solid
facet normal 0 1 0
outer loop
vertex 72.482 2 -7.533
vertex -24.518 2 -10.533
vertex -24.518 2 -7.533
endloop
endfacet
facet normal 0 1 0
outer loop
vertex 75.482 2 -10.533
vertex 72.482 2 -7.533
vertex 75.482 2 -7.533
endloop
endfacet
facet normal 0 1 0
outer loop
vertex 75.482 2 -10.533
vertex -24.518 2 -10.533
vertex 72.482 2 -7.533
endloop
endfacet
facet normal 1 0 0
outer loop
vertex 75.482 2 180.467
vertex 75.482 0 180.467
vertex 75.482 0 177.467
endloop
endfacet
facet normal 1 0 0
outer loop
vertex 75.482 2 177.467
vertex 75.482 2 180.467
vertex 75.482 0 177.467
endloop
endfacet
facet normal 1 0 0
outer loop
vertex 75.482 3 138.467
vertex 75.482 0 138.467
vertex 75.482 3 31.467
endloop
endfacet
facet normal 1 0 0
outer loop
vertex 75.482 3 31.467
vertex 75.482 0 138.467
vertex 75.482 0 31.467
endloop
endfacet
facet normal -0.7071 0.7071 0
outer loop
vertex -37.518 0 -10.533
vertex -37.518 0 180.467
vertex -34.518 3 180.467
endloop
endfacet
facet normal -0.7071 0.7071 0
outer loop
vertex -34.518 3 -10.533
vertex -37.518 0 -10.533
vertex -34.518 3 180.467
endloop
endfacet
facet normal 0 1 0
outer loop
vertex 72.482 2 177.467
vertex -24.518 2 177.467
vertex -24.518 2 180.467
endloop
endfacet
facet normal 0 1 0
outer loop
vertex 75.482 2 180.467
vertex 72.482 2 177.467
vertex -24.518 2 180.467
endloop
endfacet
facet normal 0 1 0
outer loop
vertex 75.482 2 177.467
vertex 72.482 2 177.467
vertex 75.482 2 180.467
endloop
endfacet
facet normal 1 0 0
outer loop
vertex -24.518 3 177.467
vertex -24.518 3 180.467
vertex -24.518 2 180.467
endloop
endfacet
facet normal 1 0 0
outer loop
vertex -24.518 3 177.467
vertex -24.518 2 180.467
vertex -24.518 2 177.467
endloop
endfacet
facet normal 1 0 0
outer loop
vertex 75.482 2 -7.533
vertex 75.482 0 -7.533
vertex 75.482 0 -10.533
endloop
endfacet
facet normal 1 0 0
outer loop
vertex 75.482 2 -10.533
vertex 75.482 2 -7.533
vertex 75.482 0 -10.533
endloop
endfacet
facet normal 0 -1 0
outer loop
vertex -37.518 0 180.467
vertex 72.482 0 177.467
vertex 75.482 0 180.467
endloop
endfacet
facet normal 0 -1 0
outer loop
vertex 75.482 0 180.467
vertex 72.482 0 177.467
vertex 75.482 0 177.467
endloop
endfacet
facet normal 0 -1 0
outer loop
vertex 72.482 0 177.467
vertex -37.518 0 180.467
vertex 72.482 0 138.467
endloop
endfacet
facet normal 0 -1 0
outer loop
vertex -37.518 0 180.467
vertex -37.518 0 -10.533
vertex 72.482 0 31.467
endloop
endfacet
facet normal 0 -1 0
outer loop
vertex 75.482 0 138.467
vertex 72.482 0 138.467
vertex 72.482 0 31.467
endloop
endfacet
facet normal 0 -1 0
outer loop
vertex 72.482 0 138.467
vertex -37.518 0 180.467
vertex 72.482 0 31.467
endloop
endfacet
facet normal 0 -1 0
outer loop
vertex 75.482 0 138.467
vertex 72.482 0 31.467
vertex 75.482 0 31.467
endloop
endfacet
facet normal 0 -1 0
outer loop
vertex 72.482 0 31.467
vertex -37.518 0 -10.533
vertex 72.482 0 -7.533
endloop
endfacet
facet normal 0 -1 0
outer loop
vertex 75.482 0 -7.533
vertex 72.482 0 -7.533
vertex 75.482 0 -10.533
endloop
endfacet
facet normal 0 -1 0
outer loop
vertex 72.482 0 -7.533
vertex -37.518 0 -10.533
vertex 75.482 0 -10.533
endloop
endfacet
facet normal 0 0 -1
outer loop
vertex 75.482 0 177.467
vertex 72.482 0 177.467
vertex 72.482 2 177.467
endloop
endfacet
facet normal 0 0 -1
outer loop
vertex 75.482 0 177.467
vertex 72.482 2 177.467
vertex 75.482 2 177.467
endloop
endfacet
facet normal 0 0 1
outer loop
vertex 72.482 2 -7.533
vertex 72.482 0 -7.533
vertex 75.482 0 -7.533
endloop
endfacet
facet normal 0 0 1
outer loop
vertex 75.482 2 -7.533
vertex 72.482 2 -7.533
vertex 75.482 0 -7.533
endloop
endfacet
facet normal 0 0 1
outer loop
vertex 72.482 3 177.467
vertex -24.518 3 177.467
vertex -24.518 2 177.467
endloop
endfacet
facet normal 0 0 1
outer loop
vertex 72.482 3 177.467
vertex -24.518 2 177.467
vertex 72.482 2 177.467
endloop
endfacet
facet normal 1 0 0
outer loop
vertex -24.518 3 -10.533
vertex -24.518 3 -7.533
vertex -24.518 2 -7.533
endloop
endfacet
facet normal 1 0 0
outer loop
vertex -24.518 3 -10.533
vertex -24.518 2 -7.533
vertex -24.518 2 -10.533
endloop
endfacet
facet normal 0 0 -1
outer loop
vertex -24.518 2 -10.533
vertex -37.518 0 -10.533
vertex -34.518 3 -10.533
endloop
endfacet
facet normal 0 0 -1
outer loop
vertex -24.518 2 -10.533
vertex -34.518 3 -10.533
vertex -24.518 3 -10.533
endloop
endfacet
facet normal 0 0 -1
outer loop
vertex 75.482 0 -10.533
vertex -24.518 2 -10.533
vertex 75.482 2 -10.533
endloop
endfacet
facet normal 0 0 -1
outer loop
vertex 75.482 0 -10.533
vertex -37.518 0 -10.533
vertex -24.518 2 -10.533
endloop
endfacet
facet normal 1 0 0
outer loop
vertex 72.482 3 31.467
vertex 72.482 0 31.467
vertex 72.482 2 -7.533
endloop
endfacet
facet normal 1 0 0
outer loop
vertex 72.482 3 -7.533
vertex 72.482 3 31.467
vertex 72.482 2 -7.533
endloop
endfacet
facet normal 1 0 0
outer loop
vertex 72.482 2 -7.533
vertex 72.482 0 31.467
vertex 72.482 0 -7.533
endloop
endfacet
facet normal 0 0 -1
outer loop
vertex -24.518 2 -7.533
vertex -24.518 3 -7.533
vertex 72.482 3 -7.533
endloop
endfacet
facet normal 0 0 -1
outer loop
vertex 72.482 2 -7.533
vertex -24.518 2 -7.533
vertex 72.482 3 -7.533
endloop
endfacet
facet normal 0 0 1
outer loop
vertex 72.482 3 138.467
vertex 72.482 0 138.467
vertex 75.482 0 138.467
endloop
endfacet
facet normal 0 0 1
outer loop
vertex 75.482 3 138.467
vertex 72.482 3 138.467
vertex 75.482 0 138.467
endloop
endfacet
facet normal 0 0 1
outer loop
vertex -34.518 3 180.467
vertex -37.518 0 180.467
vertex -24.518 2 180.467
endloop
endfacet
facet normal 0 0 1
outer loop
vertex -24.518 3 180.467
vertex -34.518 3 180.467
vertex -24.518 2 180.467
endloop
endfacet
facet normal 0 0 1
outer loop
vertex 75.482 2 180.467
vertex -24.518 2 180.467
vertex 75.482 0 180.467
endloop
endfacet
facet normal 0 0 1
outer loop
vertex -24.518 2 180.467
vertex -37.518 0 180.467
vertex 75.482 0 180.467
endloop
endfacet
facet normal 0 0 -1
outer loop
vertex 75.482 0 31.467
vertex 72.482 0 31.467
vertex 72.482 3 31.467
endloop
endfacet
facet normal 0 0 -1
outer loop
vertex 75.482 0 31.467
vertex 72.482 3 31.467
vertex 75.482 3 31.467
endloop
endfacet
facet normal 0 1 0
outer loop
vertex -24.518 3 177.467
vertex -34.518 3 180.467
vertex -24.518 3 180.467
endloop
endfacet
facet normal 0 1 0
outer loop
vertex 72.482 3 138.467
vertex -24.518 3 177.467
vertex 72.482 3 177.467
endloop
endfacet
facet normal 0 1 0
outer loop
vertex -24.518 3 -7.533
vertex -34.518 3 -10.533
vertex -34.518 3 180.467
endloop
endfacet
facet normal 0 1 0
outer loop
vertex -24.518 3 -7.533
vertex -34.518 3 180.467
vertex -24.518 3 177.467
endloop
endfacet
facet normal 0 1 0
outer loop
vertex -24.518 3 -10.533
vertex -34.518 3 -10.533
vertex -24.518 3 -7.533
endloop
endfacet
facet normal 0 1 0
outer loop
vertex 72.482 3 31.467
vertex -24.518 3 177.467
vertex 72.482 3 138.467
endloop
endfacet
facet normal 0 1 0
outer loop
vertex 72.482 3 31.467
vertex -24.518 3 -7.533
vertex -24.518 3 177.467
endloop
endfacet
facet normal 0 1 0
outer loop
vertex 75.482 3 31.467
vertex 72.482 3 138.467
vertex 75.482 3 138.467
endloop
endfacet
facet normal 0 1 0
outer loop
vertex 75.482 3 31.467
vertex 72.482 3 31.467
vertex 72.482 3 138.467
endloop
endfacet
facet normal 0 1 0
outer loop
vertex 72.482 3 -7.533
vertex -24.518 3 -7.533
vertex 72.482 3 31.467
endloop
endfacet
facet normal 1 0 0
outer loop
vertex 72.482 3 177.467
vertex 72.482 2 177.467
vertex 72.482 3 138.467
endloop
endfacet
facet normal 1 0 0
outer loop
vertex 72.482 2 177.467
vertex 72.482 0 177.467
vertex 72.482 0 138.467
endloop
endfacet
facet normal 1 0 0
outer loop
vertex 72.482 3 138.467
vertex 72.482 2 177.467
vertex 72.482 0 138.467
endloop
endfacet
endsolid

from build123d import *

# Parameters (mm, degrees)
SKETCH_1_W          = 120
SKETCH_1_H          = 191
EXTRUDE_2_DEPTH     = 3
CHAMFER_7_SIZE      = 10
SKETCH_3_W          = 100
SKETCH_3_H          = 3
CUT_EXTRUDE_4_DEPTH = 1
SKETCH_6_W          = 3.195264444
SKETCH_6_H          = 39
CUT_EXTRUDE_5_DEPTH = 196.640080888
SKETCH_8_W          = 3
SKETCH_8_H          = 39
CUT_EXTRUDE_6_DEPTH = 196.640080888


with BuildPart() as part:
    # 草图1 → 凸台-拉伸2 (new body)
    with BuildSketch(Plane(origin=(0, 0, 0), x_dir=(1, 0, 0), z_dir=(0, 1, 0))):
        with Locations((15.482452441, -84.96728408)):
            Rectangle(SKETCH_1_W, SKETCH_1_H)
    extrude(amount=EXTRUDE_2_DEPTH)

    # 倒角7
    # the kernel refuses this chamfer: 10 mm, written as the material it takes off along each edge
    with BuildSketch(Plane(origin=(-44.517547559, 3, 206.18411396), x_dir=(-0.027495876610586317, -0.9996219169112968, 0), z_dir=(0, 0, -1))) as chamfer_7_piece_1:
        Polygon((CHAMFER_7_SIZE * 0.999621916911, -CHAMFER_7_SIZE * 0.0274958766106), (-CHAMFER_7_SIZE * 0.0274958766106, -CHAMFER_7_SIZE * 0.999621916911), (0, 0), align=None)
    extrude(amount=242.433659759, mode=Mode.SUBTRACT)

    # 草图3 → 切除-拉伸4 (cut)
    with BuildSketch(Plane(origin=(0, 3, 0), x_dir=(1, 0, 0), z_dir=(0, 1, 0))):
        with Locations((25.482452441, -178.96728408)):
            Rectangle(SKETCH_3_W, SKETCH_3_H)
        with Locations((25.482452441, 9.03271592)):
            Rectangle(SKETCH_3_W, SKETCH_3_H)
    extrude(amount=-CUT_EXTRUDE_4_DEPTH, mode=Mode.SUBTRACT)

    # 草图6 → 切除-拉伸5 (cut, through all)
    with BuildSketch(Plane(origin=(0, 0, 0), x_dir=(1, 0, 0), z_dir=(0, 1, 0))):
        with Locations((74.080084663, -11.96728408)):
            Rectangle(SKETCH_6_W, SKETCH_6_H)
    extrude(amount=CUT_EXTRUDE_5_DEPTH, mode=Mode.SUBTRACT)

    # 草图8 → 切除-拉伸6 (cut, through all)
    with BuildSketch(Plane(origin=(0, 0, 0), x_dir=(1, 0, 0), z_dir=(0, 1, 0))):
        with Locations((73.982452441, -157.96728408)):
            Rectangle(SKETCH_8_W, SKETCH_8_H)
    extrude(amount=CUT_EXTRUDE_6_DEPTH, mode=Mode.SUBTRACT)


solid = part.part
